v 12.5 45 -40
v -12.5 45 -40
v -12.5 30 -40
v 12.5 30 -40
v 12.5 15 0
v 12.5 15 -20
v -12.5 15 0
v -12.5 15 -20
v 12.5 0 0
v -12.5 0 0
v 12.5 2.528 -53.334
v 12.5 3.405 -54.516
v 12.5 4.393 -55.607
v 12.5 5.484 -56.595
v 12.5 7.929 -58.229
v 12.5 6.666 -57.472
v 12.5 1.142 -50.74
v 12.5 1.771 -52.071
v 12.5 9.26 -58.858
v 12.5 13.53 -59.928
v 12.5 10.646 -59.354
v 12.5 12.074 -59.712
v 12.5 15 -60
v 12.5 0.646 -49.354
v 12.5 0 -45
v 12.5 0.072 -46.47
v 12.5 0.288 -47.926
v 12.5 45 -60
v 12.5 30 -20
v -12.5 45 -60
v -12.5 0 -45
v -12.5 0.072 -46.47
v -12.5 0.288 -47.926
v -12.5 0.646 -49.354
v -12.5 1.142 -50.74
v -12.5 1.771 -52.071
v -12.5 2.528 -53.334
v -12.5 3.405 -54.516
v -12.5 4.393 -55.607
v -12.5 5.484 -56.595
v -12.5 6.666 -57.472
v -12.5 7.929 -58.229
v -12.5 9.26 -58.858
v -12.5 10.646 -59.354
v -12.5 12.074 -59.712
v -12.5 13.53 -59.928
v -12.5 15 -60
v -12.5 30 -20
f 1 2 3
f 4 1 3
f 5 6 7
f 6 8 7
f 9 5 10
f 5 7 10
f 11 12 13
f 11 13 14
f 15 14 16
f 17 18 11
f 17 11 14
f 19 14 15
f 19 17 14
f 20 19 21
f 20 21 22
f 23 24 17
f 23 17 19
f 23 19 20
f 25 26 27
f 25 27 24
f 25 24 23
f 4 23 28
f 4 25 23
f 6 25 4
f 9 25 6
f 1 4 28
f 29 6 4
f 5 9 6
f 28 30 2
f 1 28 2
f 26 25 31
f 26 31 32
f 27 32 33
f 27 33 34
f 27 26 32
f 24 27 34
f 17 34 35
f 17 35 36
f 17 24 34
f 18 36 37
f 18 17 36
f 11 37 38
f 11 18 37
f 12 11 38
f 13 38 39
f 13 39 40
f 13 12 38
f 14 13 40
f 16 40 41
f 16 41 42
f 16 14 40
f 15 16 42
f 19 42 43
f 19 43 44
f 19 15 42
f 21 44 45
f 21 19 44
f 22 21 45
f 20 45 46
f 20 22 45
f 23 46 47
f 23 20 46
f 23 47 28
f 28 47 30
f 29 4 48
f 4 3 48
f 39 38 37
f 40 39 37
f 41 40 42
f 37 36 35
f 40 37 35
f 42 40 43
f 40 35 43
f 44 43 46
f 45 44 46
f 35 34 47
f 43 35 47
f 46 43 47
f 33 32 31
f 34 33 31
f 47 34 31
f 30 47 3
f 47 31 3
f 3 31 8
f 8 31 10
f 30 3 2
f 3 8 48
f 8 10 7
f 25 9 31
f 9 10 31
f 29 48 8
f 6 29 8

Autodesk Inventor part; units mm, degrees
ref_plane "YZ Plane" through (0, 0, 0) normal (1, 0, 0) x (0, 1, 0)
ref_plane "XZ Plane" through (0, 0, 0) normal (0, 1, 0) x (-1, 0, 0)
ref_plane "XY Plane" through (0, 0, 0) normal (0, 0, 1) x (1, 0, 0)
sketch "Sketch1" plane through (0, 0, 0) normal (1, 0, 0) x (0, 1, 0)
  line L0 (0, 0) -> (0, -60)
  line L1 (0, -60) -> (45, -60)
  line L2 (45, -60) -> (45, -40)
  line L3 (45, -40) -> (30, -40)
  line L4 (30, -40) -> (30, -20)
  line L5 (30, -20) -> (15, -20)
  line L6 (15, -20) -> (15, 0)
  line L7 (15, 0) -> (0, 0)
  dimension "d0" = 60
  dimension "d1" = 45
  dimension "d2" = 20
  dimension "d3" = 15
  dimension "d4" = 15
  dimension "d5" = 20
extrude "Extrusion1" add sketch "Sketch1" along normal mid plane 25
fillet "Fillet1" radius 15 1 edges at (0, 0, -60)
